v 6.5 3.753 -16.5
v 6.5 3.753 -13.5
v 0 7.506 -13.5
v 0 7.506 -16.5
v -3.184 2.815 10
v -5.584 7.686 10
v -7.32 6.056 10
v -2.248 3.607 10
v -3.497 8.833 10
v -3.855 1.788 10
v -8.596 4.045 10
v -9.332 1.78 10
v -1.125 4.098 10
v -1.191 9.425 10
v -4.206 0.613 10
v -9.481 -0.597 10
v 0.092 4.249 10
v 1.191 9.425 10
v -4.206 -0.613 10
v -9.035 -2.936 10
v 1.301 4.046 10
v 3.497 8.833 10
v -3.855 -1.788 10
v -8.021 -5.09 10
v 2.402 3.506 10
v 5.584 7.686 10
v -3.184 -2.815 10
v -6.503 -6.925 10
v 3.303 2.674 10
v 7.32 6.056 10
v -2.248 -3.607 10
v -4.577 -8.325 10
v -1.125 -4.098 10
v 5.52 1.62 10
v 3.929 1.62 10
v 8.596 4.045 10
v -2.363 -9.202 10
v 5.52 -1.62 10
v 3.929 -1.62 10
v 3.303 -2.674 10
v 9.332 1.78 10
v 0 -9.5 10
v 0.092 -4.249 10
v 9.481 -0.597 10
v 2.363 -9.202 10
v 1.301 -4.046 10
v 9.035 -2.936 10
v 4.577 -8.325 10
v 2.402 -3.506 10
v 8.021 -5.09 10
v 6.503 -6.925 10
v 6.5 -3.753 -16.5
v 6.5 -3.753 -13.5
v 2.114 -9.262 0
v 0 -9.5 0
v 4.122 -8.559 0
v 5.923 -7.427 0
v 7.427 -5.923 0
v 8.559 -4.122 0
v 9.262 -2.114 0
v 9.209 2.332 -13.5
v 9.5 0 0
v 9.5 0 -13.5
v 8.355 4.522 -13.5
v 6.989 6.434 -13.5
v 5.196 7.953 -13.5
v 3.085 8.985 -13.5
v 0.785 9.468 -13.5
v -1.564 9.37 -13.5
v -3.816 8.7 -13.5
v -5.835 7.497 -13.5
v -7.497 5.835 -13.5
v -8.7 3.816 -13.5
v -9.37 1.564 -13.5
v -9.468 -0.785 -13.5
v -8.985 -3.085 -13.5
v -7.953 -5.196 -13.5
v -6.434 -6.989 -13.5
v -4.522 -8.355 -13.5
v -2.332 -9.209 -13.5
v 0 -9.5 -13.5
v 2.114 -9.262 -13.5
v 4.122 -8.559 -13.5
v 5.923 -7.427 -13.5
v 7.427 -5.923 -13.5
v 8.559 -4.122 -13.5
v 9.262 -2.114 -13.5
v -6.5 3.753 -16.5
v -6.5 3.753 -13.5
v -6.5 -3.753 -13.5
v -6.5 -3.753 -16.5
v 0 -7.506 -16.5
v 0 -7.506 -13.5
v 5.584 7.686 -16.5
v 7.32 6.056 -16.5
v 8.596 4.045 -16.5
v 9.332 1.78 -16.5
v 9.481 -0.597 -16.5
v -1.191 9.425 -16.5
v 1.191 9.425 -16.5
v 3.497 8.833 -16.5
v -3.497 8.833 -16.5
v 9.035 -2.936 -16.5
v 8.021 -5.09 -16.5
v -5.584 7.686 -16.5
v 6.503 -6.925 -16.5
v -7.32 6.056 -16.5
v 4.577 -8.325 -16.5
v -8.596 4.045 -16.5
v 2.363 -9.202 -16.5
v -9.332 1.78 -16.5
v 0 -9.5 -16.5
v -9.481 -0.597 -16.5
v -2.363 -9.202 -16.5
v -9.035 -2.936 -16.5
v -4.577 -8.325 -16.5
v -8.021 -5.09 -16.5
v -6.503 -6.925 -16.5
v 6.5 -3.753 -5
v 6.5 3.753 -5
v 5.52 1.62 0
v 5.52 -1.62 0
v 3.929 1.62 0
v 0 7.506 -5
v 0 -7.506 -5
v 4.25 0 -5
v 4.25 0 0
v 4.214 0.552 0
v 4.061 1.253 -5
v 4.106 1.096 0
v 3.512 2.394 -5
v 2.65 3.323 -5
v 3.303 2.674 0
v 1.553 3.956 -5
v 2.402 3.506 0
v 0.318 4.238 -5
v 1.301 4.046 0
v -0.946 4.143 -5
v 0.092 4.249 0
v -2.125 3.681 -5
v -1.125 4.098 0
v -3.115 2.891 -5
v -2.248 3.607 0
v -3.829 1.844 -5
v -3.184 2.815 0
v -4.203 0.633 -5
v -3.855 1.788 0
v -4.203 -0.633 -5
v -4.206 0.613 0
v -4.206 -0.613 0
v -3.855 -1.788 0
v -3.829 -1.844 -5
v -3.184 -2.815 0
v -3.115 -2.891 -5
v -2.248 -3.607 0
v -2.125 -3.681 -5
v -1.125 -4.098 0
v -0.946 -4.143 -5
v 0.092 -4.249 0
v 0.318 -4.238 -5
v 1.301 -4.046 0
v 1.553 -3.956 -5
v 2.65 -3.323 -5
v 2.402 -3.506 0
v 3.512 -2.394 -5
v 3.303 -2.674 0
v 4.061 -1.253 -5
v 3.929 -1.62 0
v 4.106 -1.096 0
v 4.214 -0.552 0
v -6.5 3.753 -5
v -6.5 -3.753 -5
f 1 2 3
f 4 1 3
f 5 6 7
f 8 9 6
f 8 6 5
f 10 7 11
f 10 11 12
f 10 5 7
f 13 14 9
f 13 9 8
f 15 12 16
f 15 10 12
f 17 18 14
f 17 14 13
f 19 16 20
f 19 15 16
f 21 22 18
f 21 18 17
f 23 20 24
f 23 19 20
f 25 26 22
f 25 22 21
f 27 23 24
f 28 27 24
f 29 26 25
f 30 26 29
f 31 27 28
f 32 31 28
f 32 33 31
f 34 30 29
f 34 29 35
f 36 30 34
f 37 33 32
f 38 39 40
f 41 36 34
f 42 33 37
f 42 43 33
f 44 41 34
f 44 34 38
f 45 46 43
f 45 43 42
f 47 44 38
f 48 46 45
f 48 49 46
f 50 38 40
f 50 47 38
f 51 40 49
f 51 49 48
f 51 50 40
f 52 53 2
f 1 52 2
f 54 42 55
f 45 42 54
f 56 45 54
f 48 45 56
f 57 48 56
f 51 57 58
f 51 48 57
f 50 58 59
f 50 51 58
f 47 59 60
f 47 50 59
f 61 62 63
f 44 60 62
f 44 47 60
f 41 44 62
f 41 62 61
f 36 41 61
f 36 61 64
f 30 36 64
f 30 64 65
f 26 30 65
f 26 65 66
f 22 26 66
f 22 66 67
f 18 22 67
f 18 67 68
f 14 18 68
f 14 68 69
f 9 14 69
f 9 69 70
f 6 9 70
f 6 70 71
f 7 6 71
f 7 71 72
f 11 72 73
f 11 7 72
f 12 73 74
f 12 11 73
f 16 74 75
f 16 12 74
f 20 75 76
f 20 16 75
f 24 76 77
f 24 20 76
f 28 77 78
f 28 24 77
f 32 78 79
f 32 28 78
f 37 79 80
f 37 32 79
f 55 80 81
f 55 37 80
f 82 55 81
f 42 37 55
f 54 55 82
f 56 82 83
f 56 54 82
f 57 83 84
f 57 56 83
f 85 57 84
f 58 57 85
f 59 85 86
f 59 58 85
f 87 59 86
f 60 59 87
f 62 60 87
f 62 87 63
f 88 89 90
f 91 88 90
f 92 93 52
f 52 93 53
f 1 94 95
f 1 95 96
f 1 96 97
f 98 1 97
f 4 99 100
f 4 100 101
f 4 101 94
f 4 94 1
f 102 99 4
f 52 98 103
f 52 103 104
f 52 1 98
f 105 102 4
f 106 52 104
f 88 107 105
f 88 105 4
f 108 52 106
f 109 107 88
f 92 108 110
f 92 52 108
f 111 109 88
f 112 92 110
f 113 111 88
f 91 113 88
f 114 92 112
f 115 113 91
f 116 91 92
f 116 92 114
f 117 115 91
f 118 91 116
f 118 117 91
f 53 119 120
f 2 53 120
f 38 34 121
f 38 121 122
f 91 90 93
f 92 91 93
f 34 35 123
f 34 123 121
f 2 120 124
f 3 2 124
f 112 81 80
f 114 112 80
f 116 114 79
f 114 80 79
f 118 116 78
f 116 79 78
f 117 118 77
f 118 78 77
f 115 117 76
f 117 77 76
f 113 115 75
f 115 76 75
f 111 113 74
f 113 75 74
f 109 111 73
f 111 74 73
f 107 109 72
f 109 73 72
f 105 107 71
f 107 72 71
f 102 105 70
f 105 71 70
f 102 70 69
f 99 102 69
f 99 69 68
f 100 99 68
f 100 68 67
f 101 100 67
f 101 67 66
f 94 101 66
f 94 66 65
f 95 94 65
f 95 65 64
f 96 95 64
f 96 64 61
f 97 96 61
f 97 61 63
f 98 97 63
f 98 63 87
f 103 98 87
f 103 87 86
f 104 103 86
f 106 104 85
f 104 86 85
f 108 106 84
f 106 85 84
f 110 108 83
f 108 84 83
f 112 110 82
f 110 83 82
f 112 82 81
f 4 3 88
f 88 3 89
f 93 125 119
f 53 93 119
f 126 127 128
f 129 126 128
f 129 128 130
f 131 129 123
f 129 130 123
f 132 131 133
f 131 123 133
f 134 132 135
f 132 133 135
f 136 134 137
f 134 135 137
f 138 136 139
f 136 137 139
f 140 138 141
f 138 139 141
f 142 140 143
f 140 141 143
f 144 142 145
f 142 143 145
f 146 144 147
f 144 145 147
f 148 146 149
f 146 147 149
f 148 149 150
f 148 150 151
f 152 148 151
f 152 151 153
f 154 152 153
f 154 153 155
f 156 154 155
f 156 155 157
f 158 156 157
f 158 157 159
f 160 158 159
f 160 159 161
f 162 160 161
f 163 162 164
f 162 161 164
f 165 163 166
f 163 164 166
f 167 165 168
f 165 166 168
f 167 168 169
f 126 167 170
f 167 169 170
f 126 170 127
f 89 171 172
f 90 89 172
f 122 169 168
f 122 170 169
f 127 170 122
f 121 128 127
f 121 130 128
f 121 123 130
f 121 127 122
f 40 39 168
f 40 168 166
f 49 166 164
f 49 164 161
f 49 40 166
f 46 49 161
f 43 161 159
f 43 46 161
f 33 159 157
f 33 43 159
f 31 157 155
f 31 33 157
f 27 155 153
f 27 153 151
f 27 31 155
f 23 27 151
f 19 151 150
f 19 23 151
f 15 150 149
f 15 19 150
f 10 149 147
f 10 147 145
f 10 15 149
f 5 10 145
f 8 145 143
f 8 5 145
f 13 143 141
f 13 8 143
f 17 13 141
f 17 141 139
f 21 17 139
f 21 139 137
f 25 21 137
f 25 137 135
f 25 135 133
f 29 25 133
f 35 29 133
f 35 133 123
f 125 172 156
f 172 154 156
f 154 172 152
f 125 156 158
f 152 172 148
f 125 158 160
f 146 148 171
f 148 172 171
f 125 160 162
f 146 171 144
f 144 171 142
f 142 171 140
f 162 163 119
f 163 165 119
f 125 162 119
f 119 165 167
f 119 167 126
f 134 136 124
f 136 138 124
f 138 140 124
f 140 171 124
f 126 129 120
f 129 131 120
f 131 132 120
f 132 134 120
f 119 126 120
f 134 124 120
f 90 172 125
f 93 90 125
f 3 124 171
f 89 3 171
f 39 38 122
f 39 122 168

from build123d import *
from build123d.topology import SkipClean

# Parameters (mm, degrees)
SKETCH2_R              = 9.5
BOSS_EXTRUDE1_DEPTH    = 21
SKETCH3_R              = 4.25
BOSS_EXTRUDE2_DEPTH    = 5
BOSS_EXTRUDE3_START    = 10
SKETCH4_R              = 9.5
BOSS_EXTRUDE3_DEPTH    = 10
CUT_EXTRUDE1_START     = -7.5
CUT_EXTRUDE1_OUTLINE_R = 9.5
CUT_EXTRUDE1_DEPTH     = 7.5
SKETCH6_R              = 9.5
BOSS_EXTRUDE4_DEPTH    = 3


# Read off the part's stored shape, not the designer's step: Cut-Extrude1
with BuildPart() as part:
    # Sketch2 → Boss-Extrude1 (new body)
    with BuildSketch(Plane.XY):
        Circle(SKETCH2_R)
        Polygon((-6.5, -3.75277675), (0, -7.505553499), (6.5, -3.75277675), (6.5, 3.75277675), (0, 7.505553499), (-6.5, 3.75277675), align=None, mode=Mode.SUBTRACT)
    extrude(amount=-BOSS_EXTRUDE1_DEPTH)

    # Sketch3 → Boss-Extrude2 (add)
    with BuildSketch(Plane.XY):
        Polygon((-6.5, -3.75277675), (0, -7.505553499), (6.5, -3.75277675), (6.5, 3.75277675), (0, 7.505553499), (-6.5, 3.75277675), align=None)
        Circle(SKETCH3_R, mode=Mode.SUBTRACT)
    extrude(amount=-BOSS_EXTRUDE2_DEPTH)

    # Sketch4 → Boss-Extrude3 (add)
    with BuildSketch(Plane.XY.offset(BOSS_EXTRUDE3_START)):
        with Locations(Location((0, 0, 0), (0, 0, 270))):
            Circle(SKETCH4_R)
        with BuildLine():
            ThreePointArc((3.929134765, -1.62), (-4.25, 0), (3.929134765, 1.62))
            Line((3.929134765, 1.62), (5.52, 1.62))
            Line((5.52, 1.62), (5.52, -1.62))
            Line((5.52, -1.62), (3.929134765, -1.62))
        make_face(mode=Mode.SUBTRACT)
    extrude(amount=-BOSS_EXTRUDE3_DEPTH)

    # Cut-Extrude1 outline → Cut-Extrude1 (cut)
    with BuildSketch(Plane(origin=(0, 0, -21), x_dir=(-1, 0, 0), z_dir=(0, 0, -1)).offset(CUT_EXTRUDE1_START)):
        Circle(CUT_EXTRUDE1_OUTLINE_R)
        Polygon((6.5, 3.75277675), (6.5, -3.75277675), (0, -7.505553499), (-6.5, -3.75277675), (-6.5, 3.75277675), (0, 7.505553499), align=None, mode=Mode.SUBTRACT)
    extrude(amount=CUT_EXTRUDE1_DEPTH, mode=Mode.SUBTRACT)

    # Sketch6 → Boss-Extrude4 (add)
    with SkipClean():  # the faces are left unmerged after this step: merging them gives an invalid solid
        with BuildSketch(Plane(origin=(0, 0, -13.5), x_dir=(-1, 0, 0), z_dir=(0, 0, -1))):
            with Locations(Location((0, 0, 0), (0, 0, 270))):
                Circle(SKETCH6_R)
            Polygon((6.5, 3.75277675), (6.5, -3.75277675), (0, -7.505553499), (-6.5, -3.75277675), (-6.5, 3.75277675), (0, 7.505553499), align=None, mode=Mode.SUBTRACT)
        extrude(amount=BOSS_EXTRUDE4_DEPTH)
    add(part.part.scale(1), mode=Mode.REPLACE)  # the faces are merged on a copy


solid = part.part
